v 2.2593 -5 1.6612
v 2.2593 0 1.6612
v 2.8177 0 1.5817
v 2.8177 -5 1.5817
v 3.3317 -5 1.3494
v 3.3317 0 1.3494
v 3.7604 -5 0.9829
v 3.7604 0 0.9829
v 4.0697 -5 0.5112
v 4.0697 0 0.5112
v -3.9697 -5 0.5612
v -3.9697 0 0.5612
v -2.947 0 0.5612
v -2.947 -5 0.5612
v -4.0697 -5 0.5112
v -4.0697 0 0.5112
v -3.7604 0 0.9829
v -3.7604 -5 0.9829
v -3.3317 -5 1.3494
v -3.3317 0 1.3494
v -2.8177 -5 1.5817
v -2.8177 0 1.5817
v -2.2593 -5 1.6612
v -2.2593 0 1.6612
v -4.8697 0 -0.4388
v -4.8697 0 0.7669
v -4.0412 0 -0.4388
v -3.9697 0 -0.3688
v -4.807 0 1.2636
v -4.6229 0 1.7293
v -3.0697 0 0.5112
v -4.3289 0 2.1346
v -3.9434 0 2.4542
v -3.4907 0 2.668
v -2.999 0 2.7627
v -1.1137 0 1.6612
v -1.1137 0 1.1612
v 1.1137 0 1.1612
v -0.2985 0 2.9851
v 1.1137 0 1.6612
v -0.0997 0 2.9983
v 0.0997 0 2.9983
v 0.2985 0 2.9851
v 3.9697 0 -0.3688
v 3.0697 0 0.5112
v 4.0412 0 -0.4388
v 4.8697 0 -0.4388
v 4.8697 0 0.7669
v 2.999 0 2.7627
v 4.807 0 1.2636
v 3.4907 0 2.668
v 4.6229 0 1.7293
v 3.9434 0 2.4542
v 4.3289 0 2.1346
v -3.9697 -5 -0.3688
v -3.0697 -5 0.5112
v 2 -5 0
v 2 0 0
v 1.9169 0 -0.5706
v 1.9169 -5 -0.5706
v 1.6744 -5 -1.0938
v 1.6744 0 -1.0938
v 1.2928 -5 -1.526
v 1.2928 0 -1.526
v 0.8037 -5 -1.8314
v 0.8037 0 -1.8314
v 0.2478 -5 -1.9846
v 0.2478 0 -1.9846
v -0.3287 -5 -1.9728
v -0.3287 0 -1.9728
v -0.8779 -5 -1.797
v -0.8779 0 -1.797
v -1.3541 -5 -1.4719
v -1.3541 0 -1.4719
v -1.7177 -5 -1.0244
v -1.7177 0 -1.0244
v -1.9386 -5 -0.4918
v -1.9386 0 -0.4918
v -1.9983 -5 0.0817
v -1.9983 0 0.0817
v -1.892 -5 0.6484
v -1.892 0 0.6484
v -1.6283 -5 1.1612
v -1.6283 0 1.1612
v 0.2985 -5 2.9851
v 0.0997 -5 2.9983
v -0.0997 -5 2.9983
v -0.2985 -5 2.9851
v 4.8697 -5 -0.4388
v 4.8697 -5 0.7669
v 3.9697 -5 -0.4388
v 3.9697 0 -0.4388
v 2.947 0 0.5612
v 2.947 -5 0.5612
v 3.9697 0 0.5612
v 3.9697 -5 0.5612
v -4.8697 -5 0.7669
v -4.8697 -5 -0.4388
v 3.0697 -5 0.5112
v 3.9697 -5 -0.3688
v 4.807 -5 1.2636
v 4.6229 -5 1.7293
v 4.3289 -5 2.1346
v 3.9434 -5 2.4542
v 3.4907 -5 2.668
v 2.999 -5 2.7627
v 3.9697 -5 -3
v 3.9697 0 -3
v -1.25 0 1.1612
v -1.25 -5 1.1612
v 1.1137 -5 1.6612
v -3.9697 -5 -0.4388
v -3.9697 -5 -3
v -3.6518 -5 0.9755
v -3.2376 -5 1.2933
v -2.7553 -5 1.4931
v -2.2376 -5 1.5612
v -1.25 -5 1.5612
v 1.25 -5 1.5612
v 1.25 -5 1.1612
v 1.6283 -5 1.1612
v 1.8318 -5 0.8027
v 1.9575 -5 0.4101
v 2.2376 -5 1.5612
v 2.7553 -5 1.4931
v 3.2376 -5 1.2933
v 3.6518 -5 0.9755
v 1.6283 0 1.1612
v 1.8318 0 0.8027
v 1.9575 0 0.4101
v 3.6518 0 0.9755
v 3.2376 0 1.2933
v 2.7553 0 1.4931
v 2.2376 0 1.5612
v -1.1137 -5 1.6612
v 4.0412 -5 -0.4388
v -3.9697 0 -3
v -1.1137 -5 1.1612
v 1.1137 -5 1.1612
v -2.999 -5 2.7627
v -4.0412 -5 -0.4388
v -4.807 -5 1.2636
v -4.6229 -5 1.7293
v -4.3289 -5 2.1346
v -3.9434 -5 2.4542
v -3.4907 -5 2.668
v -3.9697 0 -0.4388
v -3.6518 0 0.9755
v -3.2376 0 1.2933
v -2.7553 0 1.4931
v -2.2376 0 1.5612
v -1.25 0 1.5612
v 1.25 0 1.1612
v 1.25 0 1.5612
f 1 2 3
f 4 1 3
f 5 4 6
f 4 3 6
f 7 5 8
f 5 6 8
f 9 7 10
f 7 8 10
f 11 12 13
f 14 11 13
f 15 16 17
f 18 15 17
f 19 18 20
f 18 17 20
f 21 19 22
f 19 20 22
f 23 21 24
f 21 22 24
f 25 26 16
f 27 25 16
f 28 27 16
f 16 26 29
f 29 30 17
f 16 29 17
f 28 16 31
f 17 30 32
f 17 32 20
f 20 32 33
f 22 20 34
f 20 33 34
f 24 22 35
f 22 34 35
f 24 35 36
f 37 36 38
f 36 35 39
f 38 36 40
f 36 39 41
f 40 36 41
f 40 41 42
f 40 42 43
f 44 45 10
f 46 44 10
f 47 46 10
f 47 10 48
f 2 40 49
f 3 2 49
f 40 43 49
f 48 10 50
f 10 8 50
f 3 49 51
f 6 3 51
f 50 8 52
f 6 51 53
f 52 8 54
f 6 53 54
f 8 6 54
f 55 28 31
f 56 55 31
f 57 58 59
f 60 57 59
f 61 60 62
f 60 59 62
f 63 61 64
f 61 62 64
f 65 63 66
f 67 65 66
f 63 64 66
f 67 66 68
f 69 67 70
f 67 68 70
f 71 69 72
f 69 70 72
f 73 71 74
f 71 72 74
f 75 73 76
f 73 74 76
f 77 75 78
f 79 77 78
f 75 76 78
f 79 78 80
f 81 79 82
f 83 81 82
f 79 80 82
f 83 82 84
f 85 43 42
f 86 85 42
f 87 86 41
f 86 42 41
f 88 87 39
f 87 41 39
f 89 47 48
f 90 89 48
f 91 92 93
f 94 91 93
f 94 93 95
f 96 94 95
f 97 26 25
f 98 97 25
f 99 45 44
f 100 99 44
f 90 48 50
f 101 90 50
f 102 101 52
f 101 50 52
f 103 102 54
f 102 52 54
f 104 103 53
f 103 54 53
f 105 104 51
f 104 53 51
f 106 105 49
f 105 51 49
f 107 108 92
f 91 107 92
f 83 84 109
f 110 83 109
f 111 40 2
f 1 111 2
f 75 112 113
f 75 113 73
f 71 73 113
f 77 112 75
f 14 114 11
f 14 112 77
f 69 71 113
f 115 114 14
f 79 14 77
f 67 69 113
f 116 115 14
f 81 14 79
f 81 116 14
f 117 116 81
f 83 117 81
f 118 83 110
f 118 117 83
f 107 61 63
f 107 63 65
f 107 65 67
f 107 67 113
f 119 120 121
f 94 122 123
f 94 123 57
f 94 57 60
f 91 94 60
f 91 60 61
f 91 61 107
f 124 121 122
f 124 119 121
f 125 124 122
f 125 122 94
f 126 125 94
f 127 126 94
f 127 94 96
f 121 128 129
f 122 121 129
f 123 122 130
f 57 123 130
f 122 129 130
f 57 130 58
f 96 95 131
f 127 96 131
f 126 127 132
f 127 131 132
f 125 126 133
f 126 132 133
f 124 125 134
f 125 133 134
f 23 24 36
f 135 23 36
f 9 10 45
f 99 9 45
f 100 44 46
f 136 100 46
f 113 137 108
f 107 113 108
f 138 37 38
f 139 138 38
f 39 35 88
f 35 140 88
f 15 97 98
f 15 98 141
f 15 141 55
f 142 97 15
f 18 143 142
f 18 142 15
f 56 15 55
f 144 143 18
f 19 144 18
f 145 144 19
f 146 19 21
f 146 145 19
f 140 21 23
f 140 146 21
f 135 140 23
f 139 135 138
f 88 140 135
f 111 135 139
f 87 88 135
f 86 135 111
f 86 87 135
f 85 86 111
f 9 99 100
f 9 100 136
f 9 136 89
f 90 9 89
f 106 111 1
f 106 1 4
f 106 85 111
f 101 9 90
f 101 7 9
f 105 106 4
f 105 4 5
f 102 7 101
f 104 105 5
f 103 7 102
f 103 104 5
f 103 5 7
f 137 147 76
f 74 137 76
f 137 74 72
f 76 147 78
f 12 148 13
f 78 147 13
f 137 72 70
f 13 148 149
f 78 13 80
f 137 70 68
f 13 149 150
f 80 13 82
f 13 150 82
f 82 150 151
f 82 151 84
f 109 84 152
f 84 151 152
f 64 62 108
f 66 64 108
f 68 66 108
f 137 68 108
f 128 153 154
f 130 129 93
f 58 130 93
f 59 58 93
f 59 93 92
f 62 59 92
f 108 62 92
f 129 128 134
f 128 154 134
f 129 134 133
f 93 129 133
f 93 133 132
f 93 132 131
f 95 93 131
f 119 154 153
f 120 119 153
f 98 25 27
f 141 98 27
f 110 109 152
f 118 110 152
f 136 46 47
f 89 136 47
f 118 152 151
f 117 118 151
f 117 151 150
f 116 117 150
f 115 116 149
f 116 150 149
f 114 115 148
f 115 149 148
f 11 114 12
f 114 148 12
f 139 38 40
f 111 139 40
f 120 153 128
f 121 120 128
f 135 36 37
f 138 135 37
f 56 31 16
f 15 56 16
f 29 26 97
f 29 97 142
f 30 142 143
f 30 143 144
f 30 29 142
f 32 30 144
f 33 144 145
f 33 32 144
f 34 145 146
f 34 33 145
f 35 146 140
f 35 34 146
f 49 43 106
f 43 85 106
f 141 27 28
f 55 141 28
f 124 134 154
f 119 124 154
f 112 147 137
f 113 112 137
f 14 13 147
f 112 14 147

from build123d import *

# Parameters (mm, degrees)
F1_DEPTH      = 5
F2_T1_DEPTH   = 13.6602540378
F2_2_T1_DEPTH = 5
F2_2_T3_DEPTH = 5
F2_2_T5_DEPTH = 15
F2_2_T7_DEPTH = 15
F3_R          = 77.4463937181


# Not quite as in the source:
# - a fillet or chamfer that OpenCascade refuses, or shapes differently, is made with other operations: its cross-section is extruded or revolved along the edge and cut away or added
# - a feature names something its author has since deleted; it is built from what else it names


with BuildPart() as f1:
    # F0 (on Front) → F1 (new body)
    with BuildSketch(Plane.XZ):
        with BuildLine():
            ThreePointArc((1.6283425928, 1.1612494996), (1.9048208821, 0.609637111), (2, 0))
            ThreePointArc((2, 0), (-0.609637111, -1.9048208821), (-1.6283425928, 1.1612494996))
            ThreePointArc((-1.6283425928, 1.1612494996), (-1.4530017276, 1.3743311026), (-1.25, 1.5612494996))
            Line((-1.25, 1.5612494996), (-2.5617376915, 1.5612494996))
            ThreePointArc((-2.5617376915, 1.5612494996), (-2.7993993156, 1.0785932838), (-2.9470322359, 0.5612494996))
            ThreePointArc((-2.9470322359, 0.5612494996), (-2.3112494996, -1.9126227413), (0, -3))
            ThreePointArc((0, -3), (2.1213203436, -2.1213203436), (3, 0))
            ThreePointArc((3, 0), (2.9867287044, 0.2818716839), (2.9470322359, 0.5612494996))
            ThreePointArc((2.9470322359, 0.5612494996), (2.7993993156, 1.0785932838), (2.5617376915, 1.5612494996))
            Line((2.5617376915, 1.5612494996), (1.25, 1.5612494996))
            ThreePointArc((1.25, 1.5612494996), (1.4530017276, 1.3743311026), (1.6283425928, 1.1612494996))
        make_face()
        with BuildLine():
            ThreePointArc((0, -3), (-2.3112494996, -1.9126227413), (-2.9470322359, 0.5612494996))
            Line((-2.9470322359, 0.5612494996), (-3.9696805516, -0.4387505004))
            Line((-3.9696805516, -0.4387505004), (-3.9696805516, -3))
            Line((-3.9696805516, -3), (0, -3))
        make_face()
        with BuildLine():
            ThreePointArc((-2.9470322359, 0.5612494996), (-2.7993993156, 1.0785932838), (-2.5617376915, 1.5612494996))
            Line((-2.5617376915, 1.5612494996), (-3.9696805516, 1.5612494996))
            Line((-3.9696805516, 1.5612494996), (-3.9696805516, 0.5612494996))
            Line((-3.9696805516, 0.5612494996), (-2.9470322359, 0.5612494996))
        make_face()
        with BuildLine():
            Line((3.9696805516, 1.5612494996), (2.5617376915, 1.5612494996))
            ThreePointArc((2.5617376915, 1.5612494996), (2.7993993156, 1.0785932838), (2.9470322359, 0.5612494996))
            Line((2.9470322359, 0.5612494996), (3.9696805516, 0.5612494996))
            Line((3.9696805516, 0.5612494996), (3.9696805516, 1.5612494996))
        make_face()
        with BuildLine():
            Line((3.9696805516, -0.4387505004), (2.9470322359, 0.5612494996))
            ThreePointArc((2.9470322359, 0.5612494996), (2.9867287044, 0.2818716839), (3, 0))
            ThreePointArc((3, 0), (2.1213203436, -2.1213203436), (0, -3))
            Line((0, -3), (3.9696805516, -3))
            Line((3.9696805516, -3), (3.9696805516, -0.4387505004))
        make_face()
        with BuildLine():
            ThreePointArc((-1.25, 1.5612494996), (-1.4530017276, 1.3743311026), (-1.6283425928, 1.1612494996))
            Line((-1.6283425928, 1.1612494996), (-1.25, 1.1612494996))
            Line((-1.25, 1.1612494996), (-1.25, 1.5612494996))
        make_face()
        with BuildLine():
            Line((1.25, 1.1612494996), (1.6283425928, 1.1612494996))
            ThreePointArc((1.6283425928, 1.1612494996), (1.4530017276, 1.3743311026), (1.25, 1.5612494996))
            Line((1.25, 1.5612494996), (1.25, 1.1612494996))
        make_face()
    extrude(amount=F1_DEPTH)

    # F2: fillet of radius 2 on 2 edges, made by hand

    # F2_s2 → F2_t1 (cut)
    with BuildSketch(Plane.XZ.offset(-4.3301270189)):
        with BuildLine():
            ThreePointArc((-2.237629744, 1.5612494996), (-3.237629744, 1.2933003072), (-3.9696805516, 0.5612494996))
            Line((-3.9696805516, 0.5612494996), (-3.9696805516, 1.5612494996))
            Line((-3.9696805516, 1.5612494996), (-2.237629744, 1.5612494996))
        make_face()
        with BuildLine():
            ThreePointArc((3.9696805516, 0.5612494996), (3.237629744, 1.2933003072), (2.237629744, 1.5612494996))
            Line((2.237629744, 1.5612494996), (3.9696805516, 1.5612494996))
            Line((3.9696805516, 1.5612494996), (3.9696805516, 0.5612494996))
        make_face()
    extrude(amount=F2_T1_DEPTH, mode=Mode.SUBTRACT)


with BuildPart() as f1b:
    # F0 (on Front) → F1, piece 2 (new body)
    with BuildSketch(Plane.XZ):
        with BuildLine():
            Line((-4.0696805516, 1.6612494996), (-2.4980492589, 1.6612494996))
            ThreePointArc((-2.4980492589, 1.6612494996), (-1.9105132383, 2.3129935508), (-1.1595288015, 2.7668561507))
            Line((-1.1595288015, 2.7668561507), (-4.8696805516, 2.7668561507))
            Line((-4.8696805516, 2.7668561507), (-4.8696805516, -0.4387505004))
            Line((-4.8696805516, -0.4387505004), (-4.0411964515, -0.4387505004))
            Line((-4.0411964515, -0.4387505004), (-3.9696805516, -0.3688184438))
            Line((-3.9696805516, -0.3688184438), (-3.9696805516, 0.5112494996))
            Line((-3.9696805516, 0.5112494996), (-4.0696805516, 0.5112494996))
            Line((-4.0696805516, 0.5112494996), (-4.0696805516, 1.6612494996))
        make_face()
        Polygon((-3.0696805516, 0.5112494996), (-3.9696805516, 0.5112494996), (-3.9696805516, -0.3688184438), align=None)
        with BuildLine():
            ThreePointArc((-1.1136651652, 1.6612494996), (0, 2), (1.1136651652, 1.6612494996))
            Line((1.1136651652, 1.6612494996), (2.4980492589, 1.6612494996))
            ThreePointArc((2.4980492589, 1.6612494996), (1.9105132383, 2.3129935508), (1.1595288015, 2.7668561507))
            ThreePointArc((1.1595288015, 2.7668561507), (0, 3), (-1.1595288015, 2.7668561507))
            ThreePointArc((-1.1595288015, 2.7668561507), (-1.9105132383, 2.3129935508), (-2.4980492589, 1.6612494996))
            Line((-2.4980492589, 1.6612494996), (-1.1136651652, 1.6612494996))
        make_face()
        with BuildLine():
            ThreePointArc((1.1595288015, 2.7668561507), (1.9105132383, 2.3129935508), (2.4980492589, 1.6612494996))
            Line((2.4980492589, 1.6612494996), (4.0696805516, 1.6612494996))
            Line((4.0696805516, 1.6612494996), (4.0696805516, 0.5112494996))
            Line((4.0696805516, 0.5112494996), (3.9696805516, 0.5112494996))
            Line((3.9696805516, 0.5112494996), (3.9696805516, -0.3688184438))
            Line((3.9696805516, -0.3688184438), (4.0411964515, -0.4387505004))
            Line((4.0411964515, -0.4387505004), (4.8696805516, -0.4387505004))
            Line((4.8696805516, -0.4387505004), (4.8696805516, 2.7668561507))
            Line((4.8696805516, 2.7668561507), (1.1595288015, 2.7668561507))
        make_face()
        Polygon((3.9696805516, -0.3688184438), (3.9696805516, 0.5112494996), (3.0696805516, 0.5112494996), align=None)
        with BuildLine():
            Line((1.1136651652, 1.1612494996), (1.1136651652, 1.6612494996))
            ThreePointArc((1.1136651652, 1.6612494996), (0, 2), (-1.1136651652, 1.6612494996))
            Line((-1.1136651652, 1.6612494996), (-1.1136651652, 1.1612494996))
            Line((-1.1136651652, 1.1612494996), (0, 1.1612494996))
            Line((0, 1.1612494996), (1.1136651652, 1.1612494996))
        make_face()
    extrude(amount=F1_DEPTH)

    # F2#2: fillet of radius 2 on 4 edges, made by hand

    # F2_2_s2 → F2_2_t1 (join)
    with BuildSketch(Plane.XZ):
        with BuildLine():
            ThreePointArc((-4.0696805516, 0.5112494996), (-3.331674382, 1.3494438012), (-2.2592938526, 1.6612494996))
            Line((-2.2592938526, 1.6612494996), (-4.0696805516, 1.6612494996))
            Line((-4.0696805516, 1.6612494996), (-4.0696805516, 0.5112494996))
        make_face()
    extrude(amount=F2_2_T1_DEPTH)

    # F2_2_s4 → F2_2_t3 (join)
    with BuildSketch(Plane.XZ):
        with BuildLine():
            ThreePointArc((2.2592938526, 1.6612494996), (3.331674382, 1.3494438012), (4.0696805516, 0.5112494996))
            Line((4.0696805516, 0.5112494996), (4.0696805516, 1.6612494996))
            Line((4.0696805516, 1.6612494996), (2.2592938526, 1.6612494996))
        make_face()
    extrude(amount=F2_2_T3_DEPTH)

    # F2_2_s6 → F2_2_t5 (cut)
    with BuildSketch(Plane.XZ.offset(-5)):
        with BuildLine():
            ThreePointArc((4.8696805516, 0.7668561507), (4.283894114, 2.181069713), (2.8696805516, 2.7668561507))
            Line((2.8696805516, 2.7668561507), (4.8696805516, 2.7668561507))
            Line((4.8696805516, 2.7668561507), (4.8696805516, 0.7668561507))
        make_face()
    extrude(amount=F2_2_T5_DEPTH, mode=Mode.SUBTRACT)

    # F2_2_s8 → F2_2_t7 (cut)
    with BuildSketch(Plane.XZ.offset(-5)):
        with BuildLine():
            ThreePointArc((-4.8696805516, 0.7668561507), (-4.283894114, 2.181069713), (-2.8696805516, 2.7668561507))
            Line((-2.8696805516, 2.7668561507), (-4.8696805516, 2.7668561507))
            Line((-4.8696805516, 2.7668561507), (-4.8696805516, 0.7668561507))
        make_face()
    extrude(amount=F2_2_T7_DEPTH, mode=Mode.SUBTRACT)

    # F3
    f3_edges = [f1b.edges().sort_by_distance(p)[0] for p in [
        (1.159529, -2.5, 2.766856),
        (-1.159529, -2.5, 2.766856),
    ]]
    fillet(f3_edges, radius=F3_R)


solid = Compound([f1.part, f1b.part])
